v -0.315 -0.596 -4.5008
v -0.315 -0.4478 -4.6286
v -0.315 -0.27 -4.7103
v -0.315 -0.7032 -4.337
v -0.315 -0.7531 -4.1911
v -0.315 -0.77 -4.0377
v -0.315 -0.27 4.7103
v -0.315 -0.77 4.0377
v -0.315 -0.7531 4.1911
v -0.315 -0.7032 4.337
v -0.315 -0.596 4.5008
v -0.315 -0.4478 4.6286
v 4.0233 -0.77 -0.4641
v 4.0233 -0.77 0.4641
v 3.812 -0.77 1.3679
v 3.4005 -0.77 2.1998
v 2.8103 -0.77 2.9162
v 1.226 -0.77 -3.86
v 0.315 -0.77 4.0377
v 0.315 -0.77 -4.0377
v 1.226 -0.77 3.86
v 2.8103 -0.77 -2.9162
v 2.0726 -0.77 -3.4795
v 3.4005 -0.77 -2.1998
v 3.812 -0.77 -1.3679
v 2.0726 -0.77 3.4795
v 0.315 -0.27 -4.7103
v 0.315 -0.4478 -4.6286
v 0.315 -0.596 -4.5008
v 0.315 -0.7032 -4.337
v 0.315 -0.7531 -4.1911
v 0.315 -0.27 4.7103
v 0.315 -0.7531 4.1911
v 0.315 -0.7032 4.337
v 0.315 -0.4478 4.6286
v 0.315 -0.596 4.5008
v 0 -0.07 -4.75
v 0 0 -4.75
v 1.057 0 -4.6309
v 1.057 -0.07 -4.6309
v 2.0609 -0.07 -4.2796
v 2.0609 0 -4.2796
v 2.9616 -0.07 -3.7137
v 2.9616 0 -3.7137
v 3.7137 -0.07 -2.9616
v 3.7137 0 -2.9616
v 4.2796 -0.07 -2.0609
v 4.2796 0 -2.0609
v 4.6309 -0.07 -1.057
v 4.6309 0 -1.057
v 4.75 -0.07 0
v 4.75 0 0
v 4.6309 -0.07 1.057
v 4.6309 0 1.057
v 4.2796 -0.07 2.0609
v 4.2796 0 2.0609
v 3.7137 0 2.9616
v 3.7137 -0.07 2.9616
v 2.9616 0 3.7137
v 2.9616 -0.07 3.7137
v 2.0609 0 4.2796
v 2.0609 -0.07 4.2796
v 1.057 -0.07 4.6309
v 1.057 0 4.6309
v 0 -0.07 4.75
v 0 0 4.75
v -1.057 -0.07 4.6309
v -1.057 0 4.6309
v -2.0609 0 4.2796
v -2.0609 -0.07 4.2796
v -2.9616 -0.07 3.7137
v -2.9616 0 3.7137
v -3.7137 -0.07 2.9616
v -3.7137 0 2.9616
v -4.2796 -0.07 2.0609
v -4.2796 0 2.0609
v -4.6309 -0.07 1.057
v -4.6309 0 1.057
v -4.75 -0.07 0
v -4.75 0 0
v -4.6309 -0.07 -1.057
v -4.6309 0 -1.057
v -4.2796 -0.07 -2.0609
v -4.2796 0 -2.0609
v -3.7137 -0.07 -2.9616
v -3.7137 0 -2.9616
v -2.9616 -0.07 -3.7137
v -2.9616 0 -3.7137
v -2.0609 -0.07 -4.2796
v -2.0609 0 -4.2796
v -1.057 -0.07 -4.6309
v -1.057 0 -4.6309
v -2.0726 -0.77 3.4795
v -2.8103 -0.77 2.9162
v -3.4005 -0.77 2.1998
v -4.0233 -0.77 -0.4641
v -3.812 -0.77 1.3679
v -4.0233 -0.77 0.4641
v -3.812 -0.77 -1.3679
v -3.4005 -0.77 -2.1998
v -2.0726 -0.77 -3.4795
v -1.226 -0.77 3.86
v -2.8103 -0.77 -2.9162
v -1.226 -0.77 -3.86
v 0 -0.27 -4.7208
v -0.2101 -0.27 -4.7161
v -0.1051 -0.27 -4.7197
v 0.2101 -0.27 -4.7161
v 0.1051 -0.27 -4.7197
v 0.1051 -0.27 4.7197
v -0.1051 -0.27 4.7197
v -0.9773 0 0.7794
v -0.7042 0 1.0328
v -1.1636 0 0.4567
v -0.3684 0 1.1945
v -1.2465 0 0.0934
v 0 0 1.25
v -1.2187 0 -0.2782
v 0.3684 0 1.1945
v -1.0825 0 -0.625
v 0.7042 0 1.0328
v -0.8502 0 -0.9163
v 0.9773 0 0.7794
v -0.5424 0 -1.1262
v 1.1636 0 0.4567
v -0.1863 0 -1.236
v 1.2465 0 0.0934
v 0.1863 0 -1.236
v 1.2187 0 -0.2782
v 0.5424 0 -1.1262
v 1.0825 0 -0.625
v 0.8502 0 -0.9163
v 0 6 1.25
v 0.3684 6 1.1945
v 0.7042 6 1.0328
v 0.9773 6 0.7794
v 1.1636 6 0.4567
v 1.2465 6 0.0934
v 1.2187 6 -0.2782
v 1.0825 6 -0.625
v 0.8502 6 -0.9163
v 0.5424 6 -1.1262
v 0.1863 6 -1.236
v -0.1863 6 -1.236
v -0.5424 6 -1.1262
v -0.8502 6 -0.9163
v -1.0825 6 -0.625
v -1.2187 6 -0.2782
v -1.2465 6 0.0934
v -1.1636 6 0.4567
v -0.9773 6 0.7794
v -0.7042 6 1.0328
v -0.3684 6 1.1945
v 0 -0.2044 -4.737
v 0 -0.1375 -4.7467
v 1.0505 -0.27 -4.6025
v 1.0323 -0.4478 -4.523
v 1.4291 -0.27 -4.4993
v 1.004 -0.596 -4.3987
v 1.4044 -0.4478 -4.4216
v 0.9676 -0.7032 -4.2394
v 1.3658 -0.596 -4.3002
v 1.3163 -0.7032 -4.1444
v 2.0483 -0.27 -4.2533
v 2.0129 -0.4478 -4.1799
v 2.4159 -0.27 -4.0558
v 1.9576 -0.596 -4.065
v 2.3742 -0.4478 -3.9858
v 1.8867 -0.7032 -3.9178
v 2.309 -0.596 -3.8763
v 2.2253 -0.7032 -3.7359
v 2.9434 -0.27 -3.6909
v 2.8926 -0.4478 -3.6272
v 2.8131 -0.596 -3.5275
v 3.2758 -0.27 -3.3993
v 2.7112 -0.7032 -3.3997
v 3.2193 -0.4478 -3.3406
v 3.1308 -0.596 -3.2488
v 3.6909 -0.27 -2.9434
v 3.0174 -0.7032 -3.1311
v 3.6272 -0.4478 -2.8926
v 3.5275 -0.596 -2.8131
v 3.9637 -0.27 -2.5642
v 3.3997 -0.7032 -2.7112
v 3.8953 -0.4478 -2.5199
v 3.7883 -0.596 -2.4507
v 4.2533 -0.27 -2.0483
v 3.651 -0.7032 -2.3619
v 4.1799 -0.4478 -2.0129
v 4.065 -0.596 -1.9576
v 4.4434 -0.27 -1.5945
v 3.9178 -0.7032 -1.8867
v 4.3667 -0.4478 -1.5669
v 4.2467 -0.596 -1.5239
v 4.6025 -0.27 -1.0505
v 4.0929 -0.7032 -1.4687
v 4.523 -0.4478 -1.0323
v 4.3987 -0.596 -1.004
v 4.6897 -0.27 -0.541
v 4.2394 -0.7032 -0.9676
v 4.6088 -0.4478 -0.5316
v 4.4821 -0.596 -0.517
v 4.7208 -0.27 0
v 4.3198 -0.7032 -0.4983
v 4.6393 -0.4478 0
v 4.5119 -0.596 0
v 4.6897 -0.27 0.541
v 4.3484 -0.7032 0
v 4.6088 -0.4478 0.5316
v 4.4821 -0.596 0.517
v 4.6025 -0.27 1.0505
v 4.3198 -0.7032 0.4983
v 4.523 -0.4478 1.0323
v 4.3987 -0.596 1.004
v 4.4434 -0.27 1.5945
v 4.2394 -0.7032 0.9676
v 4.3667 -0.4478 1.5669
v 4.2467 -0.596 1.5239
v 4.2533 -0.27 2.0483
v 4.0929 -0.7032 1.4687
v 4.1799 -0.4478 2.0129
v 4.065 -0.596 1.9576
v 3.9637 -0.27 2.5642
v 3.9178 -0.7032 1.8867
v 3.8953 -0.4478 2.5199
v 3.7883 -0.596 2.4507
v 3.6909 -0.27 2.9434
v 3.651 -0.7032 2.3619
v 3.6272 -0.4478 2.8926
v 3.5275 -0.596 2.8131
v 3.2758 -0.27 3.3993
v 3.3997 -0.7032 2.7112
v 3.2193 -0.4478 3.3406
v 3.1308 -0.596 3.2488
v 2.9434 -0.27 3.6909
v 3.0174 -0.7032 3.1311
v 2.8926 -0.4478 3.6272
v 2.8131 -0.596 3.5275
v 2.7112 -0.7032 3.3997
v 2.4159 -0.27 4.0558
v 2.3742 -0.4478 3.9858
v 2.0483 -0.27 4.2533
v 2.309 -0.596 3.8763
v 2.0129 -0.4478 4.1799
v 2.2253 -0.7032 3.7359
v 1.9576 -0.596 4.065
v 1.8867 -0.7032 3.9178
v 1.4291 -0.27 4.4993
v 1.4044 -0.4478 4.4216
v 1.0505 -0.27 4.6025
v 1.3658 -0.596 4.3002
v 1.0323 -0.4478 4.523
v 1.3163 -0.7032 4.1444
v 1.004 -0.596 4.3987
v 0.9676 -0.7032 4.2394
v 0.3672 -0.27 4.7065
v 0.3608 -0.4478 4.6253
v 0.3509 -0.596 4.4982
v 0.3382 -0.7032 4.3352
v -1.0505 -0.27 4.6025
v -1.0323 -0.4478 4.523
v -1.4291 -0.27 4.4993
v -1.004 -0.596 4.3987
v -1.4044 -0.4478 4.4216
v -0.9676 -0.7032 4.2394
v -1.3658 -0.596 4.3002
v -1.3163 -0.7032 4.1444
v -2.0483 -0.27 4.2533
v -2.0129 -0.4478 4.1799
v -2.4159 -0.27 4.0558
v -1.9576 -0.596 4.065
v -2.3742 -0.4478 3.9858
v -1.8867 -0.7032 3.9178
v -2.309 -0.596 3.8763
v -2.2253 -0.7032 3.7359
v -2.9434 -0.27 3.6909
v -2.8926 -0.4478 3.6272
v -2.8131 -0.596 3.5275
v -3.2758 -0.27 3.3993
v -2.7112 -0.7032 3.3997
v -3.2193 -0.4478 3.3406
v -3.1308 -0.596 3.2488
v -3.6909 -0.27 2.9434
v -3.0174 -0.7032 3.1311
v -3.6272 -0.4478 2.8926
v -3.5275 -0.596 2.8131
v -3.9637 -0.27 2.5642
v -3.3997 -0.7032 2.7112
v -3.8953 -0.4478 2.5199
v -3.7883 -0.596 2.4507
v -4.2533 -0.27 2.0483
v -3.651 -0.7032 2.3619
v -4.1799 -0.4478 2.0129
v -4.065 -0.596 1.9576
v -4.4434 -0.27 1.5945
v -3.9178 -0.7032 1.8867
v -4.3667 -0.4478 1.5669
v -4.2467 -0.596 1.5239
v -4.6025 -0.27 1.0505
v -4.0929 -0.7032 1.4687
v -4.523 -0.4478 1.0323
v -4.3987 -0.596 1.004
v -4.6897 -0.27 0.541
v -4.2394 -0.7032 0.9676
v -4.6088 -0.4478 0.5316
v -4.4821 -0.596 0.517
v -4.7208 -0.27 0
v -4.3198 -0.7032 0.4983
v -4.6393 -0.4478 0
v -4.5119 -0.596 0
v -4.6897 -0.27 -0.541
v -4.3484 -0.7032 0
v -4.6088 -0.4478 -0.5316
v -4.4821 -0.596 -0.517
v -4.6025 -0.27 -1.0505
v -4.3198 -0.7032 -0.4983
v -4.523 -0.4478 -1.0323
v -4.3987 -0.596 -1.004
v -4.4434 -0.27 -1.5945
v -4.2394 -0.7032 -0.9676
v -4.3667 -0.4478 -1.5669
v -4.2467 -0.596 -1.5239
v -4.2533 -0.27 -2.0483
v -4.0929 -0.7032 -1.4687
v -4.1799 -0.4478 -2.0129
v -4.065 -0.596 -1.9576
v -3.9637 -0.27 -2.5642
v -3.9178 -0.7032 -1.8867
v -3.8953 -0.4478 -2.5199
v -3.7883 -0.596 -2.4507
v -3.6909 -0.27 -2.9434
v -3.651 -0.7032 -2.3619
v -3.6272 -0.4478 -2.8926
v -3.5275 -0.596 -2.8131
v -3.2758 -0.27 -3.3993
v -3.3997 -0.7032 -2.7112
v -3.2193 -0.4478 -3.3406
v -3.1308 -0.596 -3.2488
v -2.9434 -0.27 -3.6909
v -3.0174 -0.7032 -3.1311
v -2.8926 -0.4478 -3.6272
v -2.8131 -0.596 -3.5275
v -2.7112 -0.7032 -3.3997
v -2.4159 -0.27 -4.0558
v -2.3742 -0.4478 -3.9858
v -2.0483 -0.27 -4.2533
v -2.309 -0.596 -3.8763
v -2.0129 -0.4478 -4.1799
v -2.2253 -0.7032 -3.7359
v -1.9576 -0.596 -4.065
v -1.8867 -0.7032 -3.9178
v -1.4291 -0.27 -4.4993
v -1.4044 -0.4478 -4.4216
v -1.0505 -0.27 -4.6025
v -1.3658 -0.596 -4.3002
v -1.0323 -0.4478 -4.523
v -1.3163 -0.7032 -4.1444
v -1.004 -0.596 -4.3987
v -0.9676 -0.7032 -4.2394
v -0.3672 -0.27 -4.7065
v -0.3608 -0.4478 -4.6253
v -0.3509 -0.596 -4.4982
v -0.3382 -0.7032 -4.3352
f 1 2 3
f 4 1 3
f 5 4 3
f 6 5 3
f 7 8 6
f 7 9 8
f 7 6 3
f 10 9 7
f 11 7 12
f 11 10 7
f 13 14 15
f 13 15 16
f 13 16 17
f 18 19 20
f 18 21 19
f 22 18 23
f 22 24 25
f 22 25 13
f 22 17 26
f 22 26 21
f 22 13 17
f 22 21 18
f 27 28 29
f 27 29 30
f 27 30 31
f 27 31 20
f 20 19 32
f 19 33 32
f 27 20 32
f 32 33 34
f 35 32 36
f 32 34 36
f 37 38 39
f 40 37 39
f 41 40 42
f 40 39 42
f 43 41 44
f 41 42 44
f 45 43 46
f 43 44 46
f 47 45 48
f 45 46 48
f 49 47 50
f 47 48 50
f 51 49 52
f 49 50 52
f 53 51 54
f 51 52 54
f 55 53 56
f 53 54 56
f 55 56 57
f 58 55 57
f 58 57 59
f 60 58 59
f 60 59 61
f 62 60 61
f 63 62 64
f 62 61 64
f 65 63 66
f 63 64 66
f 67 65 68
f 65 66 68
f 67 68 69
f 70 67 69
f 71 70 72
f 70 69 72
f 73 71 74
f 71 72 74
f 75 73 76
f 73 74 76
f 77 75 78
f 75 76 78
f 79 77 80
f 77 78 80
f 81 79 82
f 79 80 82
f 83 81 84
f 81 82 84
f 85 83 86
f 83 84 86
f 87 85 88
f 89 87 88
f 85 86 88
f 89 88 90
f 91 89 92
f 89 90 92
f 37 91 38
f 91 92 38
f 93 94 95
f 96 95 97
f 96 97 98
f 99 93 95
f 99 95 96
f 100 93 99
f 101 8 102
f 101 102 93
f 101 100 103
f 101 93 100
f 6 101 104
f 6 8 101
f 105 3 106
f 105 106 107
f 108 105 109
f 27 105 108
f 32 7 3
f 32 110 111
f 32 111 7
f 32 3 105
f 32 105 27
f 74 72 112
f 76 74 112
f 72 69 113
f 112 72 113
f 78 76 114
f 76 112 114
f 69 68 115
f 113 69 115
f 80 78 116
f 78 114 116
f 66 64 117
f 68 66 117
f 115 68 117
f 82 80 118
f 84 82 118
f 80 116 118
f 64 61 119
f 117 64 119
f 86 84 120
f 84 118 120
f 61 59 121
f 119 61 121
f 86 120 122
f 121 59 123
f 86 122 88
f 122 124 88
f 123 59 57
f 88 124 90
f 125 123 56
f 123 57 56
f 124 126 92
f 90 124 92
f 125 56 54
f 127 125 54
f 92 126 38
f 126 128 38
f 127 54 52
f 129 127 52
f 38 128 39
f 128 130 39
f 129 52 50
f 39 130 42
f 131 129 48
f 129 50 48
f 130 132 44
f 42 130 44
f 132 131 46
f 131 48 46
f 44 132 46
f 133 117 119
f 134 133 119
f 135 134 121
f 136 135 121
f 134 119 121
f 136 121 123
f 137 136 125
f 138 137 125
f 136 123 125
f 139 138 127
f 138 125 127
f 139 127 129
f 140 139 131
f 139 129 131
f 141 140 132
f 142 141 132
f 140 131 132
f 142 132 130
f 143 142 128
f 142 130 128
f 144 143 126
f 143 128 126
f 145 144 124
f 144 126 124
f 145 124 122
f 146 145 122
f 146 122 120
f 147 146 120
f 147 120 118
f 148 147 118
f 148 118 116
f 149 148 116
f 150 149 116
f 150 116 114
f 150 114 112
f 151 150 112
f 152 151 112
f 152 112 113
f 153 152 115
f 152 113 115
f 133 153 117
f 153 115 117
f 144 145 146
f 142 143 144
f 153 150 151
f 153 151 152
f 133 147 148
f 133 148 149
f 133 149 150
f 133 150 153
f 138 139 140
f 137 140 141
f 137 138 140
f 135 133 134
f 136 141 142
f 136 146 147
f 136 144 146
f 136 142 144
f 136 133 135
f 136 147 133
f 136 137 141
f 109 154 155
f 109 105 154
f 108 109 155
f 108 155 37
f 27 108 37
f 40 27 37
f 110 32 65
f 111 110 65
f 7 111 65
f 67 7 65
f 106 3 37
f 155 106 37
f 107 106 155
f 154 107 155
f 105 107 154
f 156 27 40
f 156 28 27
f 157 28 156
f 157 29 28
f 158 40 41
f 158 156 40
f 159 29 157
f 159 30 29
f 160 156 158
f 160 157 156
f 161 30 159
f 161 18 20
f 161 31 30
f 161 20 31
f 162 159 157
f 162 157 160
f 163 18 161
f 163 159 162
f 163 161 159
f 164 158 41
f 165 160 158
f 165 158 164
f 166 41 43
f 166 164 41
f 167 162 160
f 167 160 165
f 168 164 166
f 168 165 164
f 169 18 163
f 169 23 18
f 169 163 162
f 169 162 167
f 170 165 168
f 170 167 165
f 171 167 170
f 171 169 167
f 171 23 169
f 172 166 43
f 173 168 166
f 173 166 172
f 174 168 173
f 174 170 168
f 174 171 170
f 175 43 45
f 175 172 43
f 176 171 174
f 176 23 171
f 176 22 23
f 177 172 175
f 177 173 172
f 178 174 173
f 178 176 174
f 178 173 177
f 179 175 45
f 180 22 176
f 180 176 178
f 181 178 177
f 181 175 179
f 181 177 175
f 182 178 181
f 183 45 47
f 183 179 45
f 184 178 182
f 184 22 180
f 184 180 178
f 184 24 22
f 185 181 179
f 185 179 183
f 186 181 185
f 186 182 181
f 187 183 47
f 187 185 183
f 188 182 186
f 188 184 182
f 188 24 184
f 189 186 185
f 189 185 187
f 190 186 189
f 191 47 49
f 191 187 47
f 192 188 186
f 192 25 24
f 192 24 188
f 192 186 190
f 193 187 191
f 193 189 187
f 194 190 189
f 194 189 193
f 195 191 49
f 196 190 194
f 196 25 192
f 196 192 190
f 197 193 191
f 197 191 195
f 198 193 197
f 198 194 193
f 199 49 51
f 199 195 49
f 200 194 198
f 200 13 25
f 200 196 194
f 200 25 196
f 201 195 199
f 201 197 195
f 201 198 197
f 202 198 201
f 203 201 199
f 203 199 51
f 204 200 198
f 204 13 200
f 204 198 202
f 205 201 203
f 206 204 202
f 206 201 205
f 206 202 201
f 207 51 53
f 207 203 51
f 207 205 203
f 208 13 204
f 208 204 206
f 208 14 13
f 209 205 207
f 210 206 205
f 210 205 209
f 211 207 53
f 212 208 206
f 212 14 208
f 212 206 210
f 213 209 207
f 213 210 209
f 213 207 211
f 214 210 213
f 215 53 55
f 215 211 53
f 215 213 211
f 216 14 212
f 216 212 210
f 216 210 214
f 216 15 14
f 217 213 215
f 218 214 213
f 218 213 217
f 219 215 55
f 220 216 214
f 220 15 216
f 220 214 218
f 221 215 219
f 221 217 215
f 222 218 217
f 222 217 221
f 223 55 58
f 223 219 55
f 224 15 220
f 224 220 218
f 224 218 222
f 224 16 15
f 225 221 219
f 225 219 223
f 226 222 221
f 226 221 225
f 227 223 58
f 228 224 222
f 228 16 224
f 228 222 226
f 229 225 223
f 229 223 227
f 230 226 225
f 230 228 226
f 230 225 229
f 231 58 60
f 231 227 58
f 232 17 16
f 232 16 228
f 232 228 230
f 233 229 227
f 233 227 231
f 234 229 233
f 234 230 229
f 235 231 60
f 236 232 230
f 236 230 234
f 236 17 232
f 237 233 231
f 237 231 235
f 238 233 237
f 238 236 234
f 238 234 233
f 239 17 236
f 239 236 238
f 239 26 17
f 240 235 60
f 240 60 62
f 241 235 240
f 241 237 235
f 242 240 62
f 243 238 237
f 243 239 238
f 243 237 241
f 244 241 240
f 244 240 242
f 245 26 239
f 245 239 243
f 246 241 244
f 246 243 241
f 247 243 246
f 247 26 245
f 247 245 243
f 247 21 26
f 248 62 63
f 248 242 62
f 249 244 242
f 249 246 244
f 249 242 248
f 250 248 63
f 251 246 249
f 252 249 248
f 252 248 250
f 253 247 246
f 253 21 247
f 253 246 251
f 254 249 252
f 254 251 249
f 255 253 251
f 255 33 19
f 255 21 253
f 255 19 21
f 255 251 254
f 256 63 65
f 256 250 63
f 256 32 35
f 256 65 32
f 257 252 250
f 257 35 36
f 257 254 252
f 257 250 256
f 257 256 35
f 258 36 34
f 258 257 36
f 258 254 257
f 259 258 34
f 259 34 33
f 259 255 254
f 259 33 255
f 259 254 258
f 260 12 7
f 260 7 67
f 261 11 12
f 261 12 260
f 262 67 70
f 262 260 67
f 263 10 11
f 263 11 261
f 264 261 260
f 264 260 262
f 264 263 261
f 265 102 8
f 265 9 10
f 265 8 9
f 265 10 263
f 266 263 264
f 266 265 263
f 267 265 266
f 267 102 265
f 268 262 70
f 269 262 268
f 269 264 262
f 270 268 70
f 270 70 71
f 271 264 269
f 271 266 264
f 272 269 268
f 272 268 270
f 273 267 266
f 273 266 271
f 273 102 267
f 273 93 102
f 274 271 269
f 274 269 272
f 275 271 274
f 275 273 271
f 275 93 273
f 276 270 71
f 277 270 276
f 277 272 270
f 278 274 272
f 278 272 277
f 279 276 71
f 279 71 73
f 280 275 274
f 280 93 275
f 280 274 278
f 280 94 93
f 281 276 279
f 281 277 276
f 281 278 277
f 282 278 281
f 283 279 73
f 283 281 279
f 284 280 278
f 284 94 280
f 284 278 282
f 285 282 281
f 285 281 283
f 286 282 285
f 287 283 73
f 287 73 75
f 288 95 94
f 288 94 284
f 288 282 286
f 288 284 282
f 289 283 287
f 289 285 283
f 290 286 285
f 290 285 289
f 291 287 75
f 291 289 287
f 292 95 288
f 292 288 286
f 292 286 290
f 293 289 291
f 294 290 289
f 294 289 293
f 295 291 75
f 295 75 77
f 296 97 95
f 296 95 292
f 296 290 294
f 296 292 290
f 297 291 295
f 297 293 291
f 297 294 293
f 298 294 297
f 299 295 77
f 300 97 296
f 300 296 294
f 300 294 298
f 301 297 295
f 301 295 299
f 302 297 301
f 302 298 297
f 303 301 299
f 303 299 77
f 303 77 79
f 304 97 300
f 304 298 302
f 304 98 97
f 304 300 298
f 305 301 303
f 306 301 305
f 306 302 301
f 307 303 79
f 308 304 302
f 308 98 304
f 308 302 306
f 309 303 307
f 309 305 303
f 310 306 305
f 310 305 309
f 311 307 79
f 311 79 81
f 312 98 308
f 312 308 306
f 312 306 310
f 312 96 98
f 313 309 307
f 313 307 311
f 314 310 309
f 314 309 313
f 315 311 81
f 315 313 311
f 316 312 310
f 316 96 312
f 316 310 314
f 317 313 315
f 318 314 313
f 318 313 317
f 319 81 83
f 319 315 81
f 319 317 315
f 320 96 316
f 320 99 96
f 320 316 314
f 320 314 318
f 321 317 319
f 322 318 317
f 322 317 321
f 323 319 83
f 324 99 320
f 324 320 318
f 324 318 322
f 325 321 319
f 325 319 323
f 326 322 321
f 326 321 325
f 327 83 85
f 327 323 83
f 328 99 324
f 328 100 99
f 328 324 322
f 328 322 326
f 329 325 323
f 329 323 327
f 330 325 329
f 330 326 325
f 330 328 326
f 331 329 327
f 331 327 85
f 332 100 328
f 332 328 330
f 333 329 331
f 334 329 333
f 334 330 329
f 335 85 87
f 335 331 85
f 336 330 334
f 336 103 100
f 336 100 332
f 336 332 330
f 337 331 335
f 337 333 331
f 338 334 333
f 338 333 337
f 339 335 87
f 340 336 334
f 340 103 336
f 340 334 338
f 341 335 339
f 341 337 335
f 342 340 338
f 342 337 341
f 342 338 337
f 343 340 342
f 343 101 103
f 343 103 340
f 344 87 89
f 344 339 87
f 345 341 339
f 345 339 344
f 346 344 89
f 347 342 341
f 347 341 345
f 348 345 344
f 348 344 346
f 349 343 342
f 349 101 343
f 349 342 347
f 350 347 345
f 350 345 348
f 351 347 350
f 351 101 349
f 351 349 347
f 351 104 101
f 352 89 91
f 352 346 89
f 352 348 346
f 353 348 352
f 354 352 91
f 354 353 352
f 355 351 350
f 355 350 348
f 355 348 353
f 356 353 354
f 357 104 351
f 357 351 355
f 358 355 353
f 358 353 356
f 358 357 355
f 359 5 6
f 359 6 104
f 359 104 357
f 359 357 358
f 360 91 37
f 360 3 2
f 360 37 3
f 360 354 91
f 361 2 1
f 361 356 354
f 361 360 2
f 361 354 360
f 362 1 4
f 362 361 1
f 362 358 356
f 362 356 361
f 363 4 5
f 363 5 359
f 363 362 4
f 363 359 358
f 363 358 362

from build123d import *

# Parameters (mm, degrees)
SKETCH1_R           = 1.25
BOSS_EXTRUDE1_DEPTH = 6
SKETCH3_R           = 4.75
BOSS_EXTRUDE3_DEPTH = 0.77
FILLET1_R           = 0.7
SKETCH4_W           = 0.63
SKETCH4_H           = 9.781785326
CUT_EXTRUDE1_DEPTH  = 0.5


with BuildPart() as part:
    # Sketch1 → Boss-Extrude1 (new body)
    with BuildSketch(Plane(origin=(0, 0, 0), x_dir=(1, 0, 0), z_dir=(0, 1, 0))):
        Circle(SKETCH1_R)
    extrude(amount=BOSS_EXTRUDE1_DEPTH)

    # Sketch3 → Boss-Extrude3 (add)
    with BuildSketch(Plane.XZ):
        Circle(SKETCH3_R)
    extrude(amount=BOSS_EXTRUDE3_DEPTH)

    # Fillet1
    fillet1_edges = [part.edges().sort_by_distance(p)[0] for p in [
        (-4.75, -0.77, 0),
    ]]
    fillet(fillet1_edges, radius=FILLET1_R)

    # Sketch4 → Cut-Extrude1 (cut)
    with BuildSketch(Plane.XZ.offset(0.77)):
        Rectangle(SKETCH4_W, SKETCH4_H)
    extrude(amount=-CUT_EXTRUDE1_DEPTH, mode=Mode.SUBTRACT)


solid = part.part
